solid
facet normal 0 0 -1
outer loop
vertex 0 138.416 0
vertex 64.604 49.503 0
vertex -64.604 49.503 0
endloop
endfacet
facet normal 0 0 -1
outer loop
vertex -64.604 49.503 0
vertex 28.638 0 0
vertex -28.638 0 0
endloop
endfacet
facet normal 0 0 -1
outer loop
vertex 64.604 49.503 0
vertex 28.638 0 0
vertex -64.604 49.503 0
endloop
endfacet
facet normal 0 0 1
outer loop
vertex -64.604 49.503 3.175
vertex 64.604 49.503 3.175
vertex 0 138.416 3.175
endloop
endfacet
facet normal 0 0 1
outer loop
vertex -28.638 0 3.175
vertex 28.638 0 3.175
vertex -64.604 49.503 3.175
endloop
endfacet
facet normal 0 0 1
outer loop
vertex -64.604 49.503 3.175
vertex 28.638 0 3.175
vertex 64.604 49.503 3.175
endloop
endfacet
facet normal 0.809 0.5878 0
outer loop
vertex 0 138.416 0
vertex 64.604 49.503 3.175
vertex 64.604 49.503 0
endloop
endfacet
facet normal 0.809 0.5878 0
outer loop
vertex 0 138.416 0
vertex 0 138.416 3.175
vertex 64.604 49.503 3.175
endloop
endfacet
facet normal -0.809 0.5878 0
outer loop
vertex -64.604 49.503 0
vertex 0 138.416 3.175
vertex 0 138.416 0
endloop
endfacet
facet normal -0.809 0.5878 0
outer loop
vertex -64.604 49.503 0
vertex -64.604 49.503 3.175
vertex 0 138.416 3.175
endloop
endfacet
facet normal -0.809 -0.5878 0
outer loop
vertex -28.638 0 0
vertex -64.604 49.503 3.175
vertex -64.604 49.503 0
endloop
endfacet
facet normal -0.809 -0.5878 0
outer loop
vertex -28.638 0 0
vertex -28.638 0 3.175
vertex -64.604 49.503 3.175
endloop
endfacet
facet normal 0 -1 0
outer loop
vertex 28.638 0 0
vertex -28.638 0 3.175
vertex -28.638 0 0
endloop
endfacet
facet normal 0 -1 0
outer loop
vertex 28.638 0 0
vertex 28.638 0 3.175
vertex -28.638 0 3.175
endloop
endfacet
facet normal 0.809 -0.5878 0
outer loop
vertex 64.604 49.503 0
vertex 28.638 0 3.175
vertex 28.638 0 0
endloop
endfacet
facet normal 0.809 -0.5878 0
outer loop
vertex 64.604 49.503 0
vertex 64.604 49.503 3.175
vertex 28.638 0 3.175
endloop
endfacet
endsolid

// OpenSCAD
/* =====================================================
   Irregular Pentagon Plate (solid)
   =====================================================
   Symmetric five-sided plate based on the supplied sketch.
   Dimensions are specified in inches and converted to mm.

   Upper sides        : 4.327 in  (109.9058 mm), each
   Lower sides        : 2.409 in  ( 61.1886 mm), each
   Bottom edge        : 2.255 in  ( 57.2770 mm)
   Bottom angles      : 126 degrees
   Thickness          : 1/8 in    (  3.1750 mm)

   The dimension rounding produces upper and apex angles of
   107.998 and 72.004 degrees, respectively (shown as 108 and
   72 degrees in the sketch).

   Prints flat on the bed, no supports.
   ===================================================== */

in = 25.4;   // mm per inch

/* ── Dimensions (inches/degrees) ────────────────── */
upper_side_in = 4.327;
lower_side_in = 2.409;
bottom_in     = 2.255;
bottom_angle  = 126;
thickness_in  = 1/8;

/* ── Derived (mm) ───────────────────────────────── */
U = upper_side_in * in;
L = lower_side_in * in;
B = bottom_in     * in;
Z = thickness_in  * in;

lower_rise_angle = 180 - bottom_angle;
shoulder_x = B/2 + L * cos(lower_rise_angle);
shoulder_y =       L * sin(lower_rise_angle);
apex_y = shoulder_y + sqrt(U*U - shoulder_x*shoulder_x);

module irregular_pentagon_plate() {
    // Symmetric on X, bottom edge on Y = 0, sitting on Z = 0.
    linear_extrude(height = Z)
        polygon([
            [-B/2,         0],
            [ B/2,         0],
            [ shoulder_x,  shoulder_y],
            [ 0,           apex_y],
            [-shoulder_x,  shoulder_y],
        ]);
}

irregular_pentagon_plate();
